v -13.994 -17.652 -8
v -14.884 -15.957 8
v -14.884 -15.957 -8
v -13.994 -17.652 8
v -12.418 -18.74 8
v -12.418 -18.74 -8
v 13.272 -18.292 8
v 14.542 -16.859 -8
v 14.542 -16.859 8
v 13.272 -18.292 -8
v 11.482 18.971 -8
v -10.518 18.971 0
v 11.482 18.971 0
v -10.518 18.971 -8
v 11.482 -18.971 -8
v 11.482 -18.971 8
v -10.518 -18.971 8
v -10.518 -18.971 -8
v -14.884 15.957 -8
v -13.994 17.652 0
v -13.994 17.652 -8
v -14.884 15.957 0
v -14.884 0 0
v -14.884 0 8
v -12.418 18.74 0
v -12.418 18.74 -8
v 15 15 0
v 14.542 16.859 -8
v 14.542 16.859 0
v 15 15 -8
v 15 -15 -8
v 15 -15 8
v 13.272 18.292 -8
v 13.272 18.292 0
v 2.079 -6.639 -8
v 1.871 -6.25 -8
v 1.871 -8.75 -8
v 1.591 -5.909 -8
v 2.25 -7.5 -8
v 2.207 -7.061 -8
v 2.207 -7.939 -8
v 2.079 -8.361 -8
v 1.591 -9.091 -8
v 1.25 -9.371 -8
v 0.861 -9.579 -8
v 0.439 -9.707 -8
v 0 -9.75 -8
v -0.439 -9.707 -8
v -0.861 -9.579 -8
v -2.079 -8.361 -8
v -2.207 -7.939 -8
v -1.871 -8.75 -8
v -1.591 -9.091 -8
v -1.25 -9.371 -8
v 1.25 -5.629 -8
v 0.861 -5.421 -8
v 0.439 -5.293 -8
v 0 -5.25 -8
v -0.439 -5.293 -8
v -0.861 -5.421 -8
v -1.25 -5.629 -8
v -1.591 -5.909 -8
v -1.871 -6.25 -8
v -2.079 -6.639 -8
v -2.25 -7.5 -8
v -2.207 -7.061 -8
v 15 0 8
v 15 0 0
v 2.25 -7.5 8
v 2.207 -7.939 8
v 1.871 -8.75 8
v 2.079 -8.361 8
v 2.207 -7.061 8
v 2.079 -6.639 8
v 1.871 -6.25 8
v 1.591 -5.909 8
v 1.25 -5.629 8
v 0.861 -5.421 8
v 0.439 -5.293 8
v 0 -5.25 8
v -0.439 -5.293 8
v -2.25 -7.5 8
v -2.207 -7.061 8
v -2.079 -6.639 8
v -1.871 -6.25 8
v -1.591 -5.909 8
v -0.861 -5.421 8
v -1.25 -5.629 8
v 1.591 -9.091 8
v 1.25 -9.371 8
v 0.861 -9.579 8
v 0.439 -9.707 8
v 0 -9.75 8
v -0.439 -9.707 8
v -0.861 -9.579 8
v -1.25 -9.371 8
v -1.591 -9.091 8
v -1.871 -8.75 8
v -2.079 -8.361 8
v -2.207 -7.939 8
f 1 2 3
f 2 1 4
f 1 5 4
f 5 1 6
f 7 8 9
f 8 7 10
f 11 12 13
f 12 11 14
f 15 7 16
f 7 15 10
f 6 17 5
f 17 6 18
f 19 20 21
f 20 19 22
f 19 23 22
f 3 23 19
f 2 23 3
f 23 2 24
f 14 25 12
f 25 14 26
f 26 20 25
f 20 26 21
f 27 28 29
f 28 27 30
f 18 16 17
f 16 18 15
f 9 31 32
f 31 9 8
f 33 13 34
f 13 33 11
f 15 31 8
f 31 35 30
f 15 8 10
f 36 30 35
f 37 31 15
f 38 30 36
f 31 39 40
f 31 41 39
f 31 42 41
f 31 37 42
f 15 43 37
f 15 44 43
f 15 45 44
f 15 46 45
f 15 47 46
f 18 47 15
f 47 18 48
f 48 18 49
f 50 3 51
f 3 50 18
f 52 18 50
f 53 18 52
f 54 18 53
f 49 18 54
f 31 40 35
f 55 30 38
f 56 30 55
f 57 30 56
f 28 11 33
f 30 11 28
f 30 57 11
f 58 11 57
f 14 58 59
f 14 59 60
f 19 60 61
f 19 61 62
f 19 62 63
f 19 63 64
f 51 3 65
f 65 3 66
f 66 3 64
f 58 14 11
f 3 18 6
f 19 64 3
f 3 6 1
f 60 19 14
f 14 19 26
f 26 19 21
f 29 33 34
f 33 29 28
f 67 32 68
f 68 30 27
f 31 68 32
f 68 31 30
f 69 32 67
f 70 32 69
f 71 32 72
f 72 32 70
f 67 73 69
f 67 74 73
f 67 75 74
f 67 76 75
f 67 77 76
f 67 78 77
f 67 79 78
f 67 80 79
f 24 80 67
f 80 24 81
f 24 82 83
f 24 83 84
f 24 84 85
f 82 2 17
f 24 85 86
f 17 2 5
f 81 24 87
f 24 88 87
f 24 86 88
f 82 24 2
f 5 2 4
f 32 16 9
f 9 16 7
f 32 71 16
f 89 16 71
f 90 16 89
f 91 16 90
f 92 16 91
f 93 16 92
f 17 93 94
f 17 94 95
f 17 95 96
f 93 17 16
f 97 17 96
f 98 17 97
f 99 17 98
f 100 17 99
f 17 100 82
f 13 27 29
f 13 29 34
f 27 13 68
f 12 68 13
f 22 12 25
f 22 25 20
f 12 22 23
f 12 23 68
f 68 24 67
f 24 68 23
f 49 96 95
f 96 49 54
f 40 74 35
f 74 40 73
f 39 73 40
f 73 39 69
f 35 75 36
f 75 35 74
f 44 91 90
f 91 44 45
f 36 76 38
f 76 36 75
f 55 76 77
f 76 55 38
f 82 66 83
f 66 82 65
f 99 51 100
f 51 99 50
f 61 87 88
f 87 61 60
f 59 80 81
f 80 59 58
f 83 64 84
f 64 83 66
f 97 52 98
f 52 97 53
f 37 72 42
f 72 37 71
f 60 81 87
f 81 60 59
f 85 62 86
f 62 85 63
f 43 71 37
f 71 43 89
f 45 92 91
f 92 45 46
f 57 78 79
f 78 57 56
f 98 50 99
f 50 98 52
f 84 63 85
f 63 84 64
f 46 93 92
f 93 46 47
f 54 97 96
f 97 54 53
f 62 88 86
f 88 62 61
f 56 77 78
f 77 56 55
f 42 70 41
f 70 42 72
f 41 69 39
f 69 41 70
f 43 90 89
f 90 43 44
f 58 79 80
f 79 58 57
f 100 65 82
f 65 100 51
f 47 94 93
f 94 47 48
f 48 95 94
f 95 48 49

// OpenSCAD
len_phone = 145;
d_screw_m4 = 4.5;
width_phone = 56;
thikness_holder = 4;
thikness_phone = 8;
append = 15;
corner_round = 8;
w_grip = 30;

//holder_set();
//vertical_block(len_phone);
rotate([0, 180, 0]);
grip();

module grip() {
    difference() {
        grip_base();
        color("red")
        translate([0, w_grip/2, thikness_phone])
        cube([w_grip+1, w_grip, 2*thikness_phone], center=true);
        translate([0, -w_grip/4, 0])
        cylinder(d=d_screw_m4, 3*thikness_phone, center=true, $fn=32);
    }
}


module grip_base() {
    hull() {
        translate([w_grip/2-corner_round/2, -w_grip/2, 0])
        cylinder(d=corner_round, 2*thikness_phone, center=true);
        translate([-w_grip/2+corner_round/2, -w_grip/2, 0])
        cylinder(d=corner_round, 2*thikness_phone, center=true);
        translate([w_grip/2-corner_round/2, w_grip/2, 0])
        cylinder(d=corner_round, 2*thikness_phone, center=true);
        translate([-w_grip/2+corner_round/2, w_grip/2, 0])
        cylinder(d=corner_round, 2*thikness_phone, center=true);
    }
}


module horizontal_block(len_block, offset_vertical) {
    len_block = len_block + append;
    
    translate([0, offset_vertical, 0])
    cylinder(d=20, h=thikness_holder, center=true, $fn=32);
    
    difference() {
        hull() {
            translate([len_block/2, offset_vertical, 0])
            cylinder(d=9, h=thikness_holder, center=true, $fn=32);
            
            translate([-len_block/2, offset_vertical, 0])
            cylinder(d=9, h=thikness_holder, center=true, $fn=32);
        }
        color("red")
        hull() {
            translate([len_block/2, offset_vertical, 0])
            cylinder(d=d_screw_m4, h=thikness_holder+2, center=true, $fn=32);
            
            translate([-len_block/2, offset_vertical, 0])
            cylinder(d=d_screw_m4, h=thikness_holder+2, center=true, $fn=32);
        }
    }
}


module vertical_block(len_block) {
    len_block = len_block + append;
    
        difference() {
            hull() {
                //translate([0, -len_phone/2, 0])
                translate([0, -len_block/2, 0])
                cylinder(d=9, h=thikness_holder, center=true, $fn=32);
                
                //translate([0, -len_phone/2, 0])
                translate([0, len_block/2, 0])
                cylinder(d=9, h=thikness_holder, center=true, $fn=32);
            }
            color("red")
            hull() {
                //translate([0, -len_phone/2, 0])
                translate([0, -len_block/2, 0])
                cylinder(d=d_screw_m4, h=thikness_holder+2, center=true, $fn=32);
                
                //translate([0, -len_phone/2, 0])
                translate([0, len_block/2, 0])
                cylinder(d=d_screw_m4, h=thikness_holder+2, center=true, $fn=32);
        }
    }
}

module holder_set() {
    horizontal_block(len_block=width_phone, offset_vertical=10);
    vertical_block(len_block=len_phone);
}
